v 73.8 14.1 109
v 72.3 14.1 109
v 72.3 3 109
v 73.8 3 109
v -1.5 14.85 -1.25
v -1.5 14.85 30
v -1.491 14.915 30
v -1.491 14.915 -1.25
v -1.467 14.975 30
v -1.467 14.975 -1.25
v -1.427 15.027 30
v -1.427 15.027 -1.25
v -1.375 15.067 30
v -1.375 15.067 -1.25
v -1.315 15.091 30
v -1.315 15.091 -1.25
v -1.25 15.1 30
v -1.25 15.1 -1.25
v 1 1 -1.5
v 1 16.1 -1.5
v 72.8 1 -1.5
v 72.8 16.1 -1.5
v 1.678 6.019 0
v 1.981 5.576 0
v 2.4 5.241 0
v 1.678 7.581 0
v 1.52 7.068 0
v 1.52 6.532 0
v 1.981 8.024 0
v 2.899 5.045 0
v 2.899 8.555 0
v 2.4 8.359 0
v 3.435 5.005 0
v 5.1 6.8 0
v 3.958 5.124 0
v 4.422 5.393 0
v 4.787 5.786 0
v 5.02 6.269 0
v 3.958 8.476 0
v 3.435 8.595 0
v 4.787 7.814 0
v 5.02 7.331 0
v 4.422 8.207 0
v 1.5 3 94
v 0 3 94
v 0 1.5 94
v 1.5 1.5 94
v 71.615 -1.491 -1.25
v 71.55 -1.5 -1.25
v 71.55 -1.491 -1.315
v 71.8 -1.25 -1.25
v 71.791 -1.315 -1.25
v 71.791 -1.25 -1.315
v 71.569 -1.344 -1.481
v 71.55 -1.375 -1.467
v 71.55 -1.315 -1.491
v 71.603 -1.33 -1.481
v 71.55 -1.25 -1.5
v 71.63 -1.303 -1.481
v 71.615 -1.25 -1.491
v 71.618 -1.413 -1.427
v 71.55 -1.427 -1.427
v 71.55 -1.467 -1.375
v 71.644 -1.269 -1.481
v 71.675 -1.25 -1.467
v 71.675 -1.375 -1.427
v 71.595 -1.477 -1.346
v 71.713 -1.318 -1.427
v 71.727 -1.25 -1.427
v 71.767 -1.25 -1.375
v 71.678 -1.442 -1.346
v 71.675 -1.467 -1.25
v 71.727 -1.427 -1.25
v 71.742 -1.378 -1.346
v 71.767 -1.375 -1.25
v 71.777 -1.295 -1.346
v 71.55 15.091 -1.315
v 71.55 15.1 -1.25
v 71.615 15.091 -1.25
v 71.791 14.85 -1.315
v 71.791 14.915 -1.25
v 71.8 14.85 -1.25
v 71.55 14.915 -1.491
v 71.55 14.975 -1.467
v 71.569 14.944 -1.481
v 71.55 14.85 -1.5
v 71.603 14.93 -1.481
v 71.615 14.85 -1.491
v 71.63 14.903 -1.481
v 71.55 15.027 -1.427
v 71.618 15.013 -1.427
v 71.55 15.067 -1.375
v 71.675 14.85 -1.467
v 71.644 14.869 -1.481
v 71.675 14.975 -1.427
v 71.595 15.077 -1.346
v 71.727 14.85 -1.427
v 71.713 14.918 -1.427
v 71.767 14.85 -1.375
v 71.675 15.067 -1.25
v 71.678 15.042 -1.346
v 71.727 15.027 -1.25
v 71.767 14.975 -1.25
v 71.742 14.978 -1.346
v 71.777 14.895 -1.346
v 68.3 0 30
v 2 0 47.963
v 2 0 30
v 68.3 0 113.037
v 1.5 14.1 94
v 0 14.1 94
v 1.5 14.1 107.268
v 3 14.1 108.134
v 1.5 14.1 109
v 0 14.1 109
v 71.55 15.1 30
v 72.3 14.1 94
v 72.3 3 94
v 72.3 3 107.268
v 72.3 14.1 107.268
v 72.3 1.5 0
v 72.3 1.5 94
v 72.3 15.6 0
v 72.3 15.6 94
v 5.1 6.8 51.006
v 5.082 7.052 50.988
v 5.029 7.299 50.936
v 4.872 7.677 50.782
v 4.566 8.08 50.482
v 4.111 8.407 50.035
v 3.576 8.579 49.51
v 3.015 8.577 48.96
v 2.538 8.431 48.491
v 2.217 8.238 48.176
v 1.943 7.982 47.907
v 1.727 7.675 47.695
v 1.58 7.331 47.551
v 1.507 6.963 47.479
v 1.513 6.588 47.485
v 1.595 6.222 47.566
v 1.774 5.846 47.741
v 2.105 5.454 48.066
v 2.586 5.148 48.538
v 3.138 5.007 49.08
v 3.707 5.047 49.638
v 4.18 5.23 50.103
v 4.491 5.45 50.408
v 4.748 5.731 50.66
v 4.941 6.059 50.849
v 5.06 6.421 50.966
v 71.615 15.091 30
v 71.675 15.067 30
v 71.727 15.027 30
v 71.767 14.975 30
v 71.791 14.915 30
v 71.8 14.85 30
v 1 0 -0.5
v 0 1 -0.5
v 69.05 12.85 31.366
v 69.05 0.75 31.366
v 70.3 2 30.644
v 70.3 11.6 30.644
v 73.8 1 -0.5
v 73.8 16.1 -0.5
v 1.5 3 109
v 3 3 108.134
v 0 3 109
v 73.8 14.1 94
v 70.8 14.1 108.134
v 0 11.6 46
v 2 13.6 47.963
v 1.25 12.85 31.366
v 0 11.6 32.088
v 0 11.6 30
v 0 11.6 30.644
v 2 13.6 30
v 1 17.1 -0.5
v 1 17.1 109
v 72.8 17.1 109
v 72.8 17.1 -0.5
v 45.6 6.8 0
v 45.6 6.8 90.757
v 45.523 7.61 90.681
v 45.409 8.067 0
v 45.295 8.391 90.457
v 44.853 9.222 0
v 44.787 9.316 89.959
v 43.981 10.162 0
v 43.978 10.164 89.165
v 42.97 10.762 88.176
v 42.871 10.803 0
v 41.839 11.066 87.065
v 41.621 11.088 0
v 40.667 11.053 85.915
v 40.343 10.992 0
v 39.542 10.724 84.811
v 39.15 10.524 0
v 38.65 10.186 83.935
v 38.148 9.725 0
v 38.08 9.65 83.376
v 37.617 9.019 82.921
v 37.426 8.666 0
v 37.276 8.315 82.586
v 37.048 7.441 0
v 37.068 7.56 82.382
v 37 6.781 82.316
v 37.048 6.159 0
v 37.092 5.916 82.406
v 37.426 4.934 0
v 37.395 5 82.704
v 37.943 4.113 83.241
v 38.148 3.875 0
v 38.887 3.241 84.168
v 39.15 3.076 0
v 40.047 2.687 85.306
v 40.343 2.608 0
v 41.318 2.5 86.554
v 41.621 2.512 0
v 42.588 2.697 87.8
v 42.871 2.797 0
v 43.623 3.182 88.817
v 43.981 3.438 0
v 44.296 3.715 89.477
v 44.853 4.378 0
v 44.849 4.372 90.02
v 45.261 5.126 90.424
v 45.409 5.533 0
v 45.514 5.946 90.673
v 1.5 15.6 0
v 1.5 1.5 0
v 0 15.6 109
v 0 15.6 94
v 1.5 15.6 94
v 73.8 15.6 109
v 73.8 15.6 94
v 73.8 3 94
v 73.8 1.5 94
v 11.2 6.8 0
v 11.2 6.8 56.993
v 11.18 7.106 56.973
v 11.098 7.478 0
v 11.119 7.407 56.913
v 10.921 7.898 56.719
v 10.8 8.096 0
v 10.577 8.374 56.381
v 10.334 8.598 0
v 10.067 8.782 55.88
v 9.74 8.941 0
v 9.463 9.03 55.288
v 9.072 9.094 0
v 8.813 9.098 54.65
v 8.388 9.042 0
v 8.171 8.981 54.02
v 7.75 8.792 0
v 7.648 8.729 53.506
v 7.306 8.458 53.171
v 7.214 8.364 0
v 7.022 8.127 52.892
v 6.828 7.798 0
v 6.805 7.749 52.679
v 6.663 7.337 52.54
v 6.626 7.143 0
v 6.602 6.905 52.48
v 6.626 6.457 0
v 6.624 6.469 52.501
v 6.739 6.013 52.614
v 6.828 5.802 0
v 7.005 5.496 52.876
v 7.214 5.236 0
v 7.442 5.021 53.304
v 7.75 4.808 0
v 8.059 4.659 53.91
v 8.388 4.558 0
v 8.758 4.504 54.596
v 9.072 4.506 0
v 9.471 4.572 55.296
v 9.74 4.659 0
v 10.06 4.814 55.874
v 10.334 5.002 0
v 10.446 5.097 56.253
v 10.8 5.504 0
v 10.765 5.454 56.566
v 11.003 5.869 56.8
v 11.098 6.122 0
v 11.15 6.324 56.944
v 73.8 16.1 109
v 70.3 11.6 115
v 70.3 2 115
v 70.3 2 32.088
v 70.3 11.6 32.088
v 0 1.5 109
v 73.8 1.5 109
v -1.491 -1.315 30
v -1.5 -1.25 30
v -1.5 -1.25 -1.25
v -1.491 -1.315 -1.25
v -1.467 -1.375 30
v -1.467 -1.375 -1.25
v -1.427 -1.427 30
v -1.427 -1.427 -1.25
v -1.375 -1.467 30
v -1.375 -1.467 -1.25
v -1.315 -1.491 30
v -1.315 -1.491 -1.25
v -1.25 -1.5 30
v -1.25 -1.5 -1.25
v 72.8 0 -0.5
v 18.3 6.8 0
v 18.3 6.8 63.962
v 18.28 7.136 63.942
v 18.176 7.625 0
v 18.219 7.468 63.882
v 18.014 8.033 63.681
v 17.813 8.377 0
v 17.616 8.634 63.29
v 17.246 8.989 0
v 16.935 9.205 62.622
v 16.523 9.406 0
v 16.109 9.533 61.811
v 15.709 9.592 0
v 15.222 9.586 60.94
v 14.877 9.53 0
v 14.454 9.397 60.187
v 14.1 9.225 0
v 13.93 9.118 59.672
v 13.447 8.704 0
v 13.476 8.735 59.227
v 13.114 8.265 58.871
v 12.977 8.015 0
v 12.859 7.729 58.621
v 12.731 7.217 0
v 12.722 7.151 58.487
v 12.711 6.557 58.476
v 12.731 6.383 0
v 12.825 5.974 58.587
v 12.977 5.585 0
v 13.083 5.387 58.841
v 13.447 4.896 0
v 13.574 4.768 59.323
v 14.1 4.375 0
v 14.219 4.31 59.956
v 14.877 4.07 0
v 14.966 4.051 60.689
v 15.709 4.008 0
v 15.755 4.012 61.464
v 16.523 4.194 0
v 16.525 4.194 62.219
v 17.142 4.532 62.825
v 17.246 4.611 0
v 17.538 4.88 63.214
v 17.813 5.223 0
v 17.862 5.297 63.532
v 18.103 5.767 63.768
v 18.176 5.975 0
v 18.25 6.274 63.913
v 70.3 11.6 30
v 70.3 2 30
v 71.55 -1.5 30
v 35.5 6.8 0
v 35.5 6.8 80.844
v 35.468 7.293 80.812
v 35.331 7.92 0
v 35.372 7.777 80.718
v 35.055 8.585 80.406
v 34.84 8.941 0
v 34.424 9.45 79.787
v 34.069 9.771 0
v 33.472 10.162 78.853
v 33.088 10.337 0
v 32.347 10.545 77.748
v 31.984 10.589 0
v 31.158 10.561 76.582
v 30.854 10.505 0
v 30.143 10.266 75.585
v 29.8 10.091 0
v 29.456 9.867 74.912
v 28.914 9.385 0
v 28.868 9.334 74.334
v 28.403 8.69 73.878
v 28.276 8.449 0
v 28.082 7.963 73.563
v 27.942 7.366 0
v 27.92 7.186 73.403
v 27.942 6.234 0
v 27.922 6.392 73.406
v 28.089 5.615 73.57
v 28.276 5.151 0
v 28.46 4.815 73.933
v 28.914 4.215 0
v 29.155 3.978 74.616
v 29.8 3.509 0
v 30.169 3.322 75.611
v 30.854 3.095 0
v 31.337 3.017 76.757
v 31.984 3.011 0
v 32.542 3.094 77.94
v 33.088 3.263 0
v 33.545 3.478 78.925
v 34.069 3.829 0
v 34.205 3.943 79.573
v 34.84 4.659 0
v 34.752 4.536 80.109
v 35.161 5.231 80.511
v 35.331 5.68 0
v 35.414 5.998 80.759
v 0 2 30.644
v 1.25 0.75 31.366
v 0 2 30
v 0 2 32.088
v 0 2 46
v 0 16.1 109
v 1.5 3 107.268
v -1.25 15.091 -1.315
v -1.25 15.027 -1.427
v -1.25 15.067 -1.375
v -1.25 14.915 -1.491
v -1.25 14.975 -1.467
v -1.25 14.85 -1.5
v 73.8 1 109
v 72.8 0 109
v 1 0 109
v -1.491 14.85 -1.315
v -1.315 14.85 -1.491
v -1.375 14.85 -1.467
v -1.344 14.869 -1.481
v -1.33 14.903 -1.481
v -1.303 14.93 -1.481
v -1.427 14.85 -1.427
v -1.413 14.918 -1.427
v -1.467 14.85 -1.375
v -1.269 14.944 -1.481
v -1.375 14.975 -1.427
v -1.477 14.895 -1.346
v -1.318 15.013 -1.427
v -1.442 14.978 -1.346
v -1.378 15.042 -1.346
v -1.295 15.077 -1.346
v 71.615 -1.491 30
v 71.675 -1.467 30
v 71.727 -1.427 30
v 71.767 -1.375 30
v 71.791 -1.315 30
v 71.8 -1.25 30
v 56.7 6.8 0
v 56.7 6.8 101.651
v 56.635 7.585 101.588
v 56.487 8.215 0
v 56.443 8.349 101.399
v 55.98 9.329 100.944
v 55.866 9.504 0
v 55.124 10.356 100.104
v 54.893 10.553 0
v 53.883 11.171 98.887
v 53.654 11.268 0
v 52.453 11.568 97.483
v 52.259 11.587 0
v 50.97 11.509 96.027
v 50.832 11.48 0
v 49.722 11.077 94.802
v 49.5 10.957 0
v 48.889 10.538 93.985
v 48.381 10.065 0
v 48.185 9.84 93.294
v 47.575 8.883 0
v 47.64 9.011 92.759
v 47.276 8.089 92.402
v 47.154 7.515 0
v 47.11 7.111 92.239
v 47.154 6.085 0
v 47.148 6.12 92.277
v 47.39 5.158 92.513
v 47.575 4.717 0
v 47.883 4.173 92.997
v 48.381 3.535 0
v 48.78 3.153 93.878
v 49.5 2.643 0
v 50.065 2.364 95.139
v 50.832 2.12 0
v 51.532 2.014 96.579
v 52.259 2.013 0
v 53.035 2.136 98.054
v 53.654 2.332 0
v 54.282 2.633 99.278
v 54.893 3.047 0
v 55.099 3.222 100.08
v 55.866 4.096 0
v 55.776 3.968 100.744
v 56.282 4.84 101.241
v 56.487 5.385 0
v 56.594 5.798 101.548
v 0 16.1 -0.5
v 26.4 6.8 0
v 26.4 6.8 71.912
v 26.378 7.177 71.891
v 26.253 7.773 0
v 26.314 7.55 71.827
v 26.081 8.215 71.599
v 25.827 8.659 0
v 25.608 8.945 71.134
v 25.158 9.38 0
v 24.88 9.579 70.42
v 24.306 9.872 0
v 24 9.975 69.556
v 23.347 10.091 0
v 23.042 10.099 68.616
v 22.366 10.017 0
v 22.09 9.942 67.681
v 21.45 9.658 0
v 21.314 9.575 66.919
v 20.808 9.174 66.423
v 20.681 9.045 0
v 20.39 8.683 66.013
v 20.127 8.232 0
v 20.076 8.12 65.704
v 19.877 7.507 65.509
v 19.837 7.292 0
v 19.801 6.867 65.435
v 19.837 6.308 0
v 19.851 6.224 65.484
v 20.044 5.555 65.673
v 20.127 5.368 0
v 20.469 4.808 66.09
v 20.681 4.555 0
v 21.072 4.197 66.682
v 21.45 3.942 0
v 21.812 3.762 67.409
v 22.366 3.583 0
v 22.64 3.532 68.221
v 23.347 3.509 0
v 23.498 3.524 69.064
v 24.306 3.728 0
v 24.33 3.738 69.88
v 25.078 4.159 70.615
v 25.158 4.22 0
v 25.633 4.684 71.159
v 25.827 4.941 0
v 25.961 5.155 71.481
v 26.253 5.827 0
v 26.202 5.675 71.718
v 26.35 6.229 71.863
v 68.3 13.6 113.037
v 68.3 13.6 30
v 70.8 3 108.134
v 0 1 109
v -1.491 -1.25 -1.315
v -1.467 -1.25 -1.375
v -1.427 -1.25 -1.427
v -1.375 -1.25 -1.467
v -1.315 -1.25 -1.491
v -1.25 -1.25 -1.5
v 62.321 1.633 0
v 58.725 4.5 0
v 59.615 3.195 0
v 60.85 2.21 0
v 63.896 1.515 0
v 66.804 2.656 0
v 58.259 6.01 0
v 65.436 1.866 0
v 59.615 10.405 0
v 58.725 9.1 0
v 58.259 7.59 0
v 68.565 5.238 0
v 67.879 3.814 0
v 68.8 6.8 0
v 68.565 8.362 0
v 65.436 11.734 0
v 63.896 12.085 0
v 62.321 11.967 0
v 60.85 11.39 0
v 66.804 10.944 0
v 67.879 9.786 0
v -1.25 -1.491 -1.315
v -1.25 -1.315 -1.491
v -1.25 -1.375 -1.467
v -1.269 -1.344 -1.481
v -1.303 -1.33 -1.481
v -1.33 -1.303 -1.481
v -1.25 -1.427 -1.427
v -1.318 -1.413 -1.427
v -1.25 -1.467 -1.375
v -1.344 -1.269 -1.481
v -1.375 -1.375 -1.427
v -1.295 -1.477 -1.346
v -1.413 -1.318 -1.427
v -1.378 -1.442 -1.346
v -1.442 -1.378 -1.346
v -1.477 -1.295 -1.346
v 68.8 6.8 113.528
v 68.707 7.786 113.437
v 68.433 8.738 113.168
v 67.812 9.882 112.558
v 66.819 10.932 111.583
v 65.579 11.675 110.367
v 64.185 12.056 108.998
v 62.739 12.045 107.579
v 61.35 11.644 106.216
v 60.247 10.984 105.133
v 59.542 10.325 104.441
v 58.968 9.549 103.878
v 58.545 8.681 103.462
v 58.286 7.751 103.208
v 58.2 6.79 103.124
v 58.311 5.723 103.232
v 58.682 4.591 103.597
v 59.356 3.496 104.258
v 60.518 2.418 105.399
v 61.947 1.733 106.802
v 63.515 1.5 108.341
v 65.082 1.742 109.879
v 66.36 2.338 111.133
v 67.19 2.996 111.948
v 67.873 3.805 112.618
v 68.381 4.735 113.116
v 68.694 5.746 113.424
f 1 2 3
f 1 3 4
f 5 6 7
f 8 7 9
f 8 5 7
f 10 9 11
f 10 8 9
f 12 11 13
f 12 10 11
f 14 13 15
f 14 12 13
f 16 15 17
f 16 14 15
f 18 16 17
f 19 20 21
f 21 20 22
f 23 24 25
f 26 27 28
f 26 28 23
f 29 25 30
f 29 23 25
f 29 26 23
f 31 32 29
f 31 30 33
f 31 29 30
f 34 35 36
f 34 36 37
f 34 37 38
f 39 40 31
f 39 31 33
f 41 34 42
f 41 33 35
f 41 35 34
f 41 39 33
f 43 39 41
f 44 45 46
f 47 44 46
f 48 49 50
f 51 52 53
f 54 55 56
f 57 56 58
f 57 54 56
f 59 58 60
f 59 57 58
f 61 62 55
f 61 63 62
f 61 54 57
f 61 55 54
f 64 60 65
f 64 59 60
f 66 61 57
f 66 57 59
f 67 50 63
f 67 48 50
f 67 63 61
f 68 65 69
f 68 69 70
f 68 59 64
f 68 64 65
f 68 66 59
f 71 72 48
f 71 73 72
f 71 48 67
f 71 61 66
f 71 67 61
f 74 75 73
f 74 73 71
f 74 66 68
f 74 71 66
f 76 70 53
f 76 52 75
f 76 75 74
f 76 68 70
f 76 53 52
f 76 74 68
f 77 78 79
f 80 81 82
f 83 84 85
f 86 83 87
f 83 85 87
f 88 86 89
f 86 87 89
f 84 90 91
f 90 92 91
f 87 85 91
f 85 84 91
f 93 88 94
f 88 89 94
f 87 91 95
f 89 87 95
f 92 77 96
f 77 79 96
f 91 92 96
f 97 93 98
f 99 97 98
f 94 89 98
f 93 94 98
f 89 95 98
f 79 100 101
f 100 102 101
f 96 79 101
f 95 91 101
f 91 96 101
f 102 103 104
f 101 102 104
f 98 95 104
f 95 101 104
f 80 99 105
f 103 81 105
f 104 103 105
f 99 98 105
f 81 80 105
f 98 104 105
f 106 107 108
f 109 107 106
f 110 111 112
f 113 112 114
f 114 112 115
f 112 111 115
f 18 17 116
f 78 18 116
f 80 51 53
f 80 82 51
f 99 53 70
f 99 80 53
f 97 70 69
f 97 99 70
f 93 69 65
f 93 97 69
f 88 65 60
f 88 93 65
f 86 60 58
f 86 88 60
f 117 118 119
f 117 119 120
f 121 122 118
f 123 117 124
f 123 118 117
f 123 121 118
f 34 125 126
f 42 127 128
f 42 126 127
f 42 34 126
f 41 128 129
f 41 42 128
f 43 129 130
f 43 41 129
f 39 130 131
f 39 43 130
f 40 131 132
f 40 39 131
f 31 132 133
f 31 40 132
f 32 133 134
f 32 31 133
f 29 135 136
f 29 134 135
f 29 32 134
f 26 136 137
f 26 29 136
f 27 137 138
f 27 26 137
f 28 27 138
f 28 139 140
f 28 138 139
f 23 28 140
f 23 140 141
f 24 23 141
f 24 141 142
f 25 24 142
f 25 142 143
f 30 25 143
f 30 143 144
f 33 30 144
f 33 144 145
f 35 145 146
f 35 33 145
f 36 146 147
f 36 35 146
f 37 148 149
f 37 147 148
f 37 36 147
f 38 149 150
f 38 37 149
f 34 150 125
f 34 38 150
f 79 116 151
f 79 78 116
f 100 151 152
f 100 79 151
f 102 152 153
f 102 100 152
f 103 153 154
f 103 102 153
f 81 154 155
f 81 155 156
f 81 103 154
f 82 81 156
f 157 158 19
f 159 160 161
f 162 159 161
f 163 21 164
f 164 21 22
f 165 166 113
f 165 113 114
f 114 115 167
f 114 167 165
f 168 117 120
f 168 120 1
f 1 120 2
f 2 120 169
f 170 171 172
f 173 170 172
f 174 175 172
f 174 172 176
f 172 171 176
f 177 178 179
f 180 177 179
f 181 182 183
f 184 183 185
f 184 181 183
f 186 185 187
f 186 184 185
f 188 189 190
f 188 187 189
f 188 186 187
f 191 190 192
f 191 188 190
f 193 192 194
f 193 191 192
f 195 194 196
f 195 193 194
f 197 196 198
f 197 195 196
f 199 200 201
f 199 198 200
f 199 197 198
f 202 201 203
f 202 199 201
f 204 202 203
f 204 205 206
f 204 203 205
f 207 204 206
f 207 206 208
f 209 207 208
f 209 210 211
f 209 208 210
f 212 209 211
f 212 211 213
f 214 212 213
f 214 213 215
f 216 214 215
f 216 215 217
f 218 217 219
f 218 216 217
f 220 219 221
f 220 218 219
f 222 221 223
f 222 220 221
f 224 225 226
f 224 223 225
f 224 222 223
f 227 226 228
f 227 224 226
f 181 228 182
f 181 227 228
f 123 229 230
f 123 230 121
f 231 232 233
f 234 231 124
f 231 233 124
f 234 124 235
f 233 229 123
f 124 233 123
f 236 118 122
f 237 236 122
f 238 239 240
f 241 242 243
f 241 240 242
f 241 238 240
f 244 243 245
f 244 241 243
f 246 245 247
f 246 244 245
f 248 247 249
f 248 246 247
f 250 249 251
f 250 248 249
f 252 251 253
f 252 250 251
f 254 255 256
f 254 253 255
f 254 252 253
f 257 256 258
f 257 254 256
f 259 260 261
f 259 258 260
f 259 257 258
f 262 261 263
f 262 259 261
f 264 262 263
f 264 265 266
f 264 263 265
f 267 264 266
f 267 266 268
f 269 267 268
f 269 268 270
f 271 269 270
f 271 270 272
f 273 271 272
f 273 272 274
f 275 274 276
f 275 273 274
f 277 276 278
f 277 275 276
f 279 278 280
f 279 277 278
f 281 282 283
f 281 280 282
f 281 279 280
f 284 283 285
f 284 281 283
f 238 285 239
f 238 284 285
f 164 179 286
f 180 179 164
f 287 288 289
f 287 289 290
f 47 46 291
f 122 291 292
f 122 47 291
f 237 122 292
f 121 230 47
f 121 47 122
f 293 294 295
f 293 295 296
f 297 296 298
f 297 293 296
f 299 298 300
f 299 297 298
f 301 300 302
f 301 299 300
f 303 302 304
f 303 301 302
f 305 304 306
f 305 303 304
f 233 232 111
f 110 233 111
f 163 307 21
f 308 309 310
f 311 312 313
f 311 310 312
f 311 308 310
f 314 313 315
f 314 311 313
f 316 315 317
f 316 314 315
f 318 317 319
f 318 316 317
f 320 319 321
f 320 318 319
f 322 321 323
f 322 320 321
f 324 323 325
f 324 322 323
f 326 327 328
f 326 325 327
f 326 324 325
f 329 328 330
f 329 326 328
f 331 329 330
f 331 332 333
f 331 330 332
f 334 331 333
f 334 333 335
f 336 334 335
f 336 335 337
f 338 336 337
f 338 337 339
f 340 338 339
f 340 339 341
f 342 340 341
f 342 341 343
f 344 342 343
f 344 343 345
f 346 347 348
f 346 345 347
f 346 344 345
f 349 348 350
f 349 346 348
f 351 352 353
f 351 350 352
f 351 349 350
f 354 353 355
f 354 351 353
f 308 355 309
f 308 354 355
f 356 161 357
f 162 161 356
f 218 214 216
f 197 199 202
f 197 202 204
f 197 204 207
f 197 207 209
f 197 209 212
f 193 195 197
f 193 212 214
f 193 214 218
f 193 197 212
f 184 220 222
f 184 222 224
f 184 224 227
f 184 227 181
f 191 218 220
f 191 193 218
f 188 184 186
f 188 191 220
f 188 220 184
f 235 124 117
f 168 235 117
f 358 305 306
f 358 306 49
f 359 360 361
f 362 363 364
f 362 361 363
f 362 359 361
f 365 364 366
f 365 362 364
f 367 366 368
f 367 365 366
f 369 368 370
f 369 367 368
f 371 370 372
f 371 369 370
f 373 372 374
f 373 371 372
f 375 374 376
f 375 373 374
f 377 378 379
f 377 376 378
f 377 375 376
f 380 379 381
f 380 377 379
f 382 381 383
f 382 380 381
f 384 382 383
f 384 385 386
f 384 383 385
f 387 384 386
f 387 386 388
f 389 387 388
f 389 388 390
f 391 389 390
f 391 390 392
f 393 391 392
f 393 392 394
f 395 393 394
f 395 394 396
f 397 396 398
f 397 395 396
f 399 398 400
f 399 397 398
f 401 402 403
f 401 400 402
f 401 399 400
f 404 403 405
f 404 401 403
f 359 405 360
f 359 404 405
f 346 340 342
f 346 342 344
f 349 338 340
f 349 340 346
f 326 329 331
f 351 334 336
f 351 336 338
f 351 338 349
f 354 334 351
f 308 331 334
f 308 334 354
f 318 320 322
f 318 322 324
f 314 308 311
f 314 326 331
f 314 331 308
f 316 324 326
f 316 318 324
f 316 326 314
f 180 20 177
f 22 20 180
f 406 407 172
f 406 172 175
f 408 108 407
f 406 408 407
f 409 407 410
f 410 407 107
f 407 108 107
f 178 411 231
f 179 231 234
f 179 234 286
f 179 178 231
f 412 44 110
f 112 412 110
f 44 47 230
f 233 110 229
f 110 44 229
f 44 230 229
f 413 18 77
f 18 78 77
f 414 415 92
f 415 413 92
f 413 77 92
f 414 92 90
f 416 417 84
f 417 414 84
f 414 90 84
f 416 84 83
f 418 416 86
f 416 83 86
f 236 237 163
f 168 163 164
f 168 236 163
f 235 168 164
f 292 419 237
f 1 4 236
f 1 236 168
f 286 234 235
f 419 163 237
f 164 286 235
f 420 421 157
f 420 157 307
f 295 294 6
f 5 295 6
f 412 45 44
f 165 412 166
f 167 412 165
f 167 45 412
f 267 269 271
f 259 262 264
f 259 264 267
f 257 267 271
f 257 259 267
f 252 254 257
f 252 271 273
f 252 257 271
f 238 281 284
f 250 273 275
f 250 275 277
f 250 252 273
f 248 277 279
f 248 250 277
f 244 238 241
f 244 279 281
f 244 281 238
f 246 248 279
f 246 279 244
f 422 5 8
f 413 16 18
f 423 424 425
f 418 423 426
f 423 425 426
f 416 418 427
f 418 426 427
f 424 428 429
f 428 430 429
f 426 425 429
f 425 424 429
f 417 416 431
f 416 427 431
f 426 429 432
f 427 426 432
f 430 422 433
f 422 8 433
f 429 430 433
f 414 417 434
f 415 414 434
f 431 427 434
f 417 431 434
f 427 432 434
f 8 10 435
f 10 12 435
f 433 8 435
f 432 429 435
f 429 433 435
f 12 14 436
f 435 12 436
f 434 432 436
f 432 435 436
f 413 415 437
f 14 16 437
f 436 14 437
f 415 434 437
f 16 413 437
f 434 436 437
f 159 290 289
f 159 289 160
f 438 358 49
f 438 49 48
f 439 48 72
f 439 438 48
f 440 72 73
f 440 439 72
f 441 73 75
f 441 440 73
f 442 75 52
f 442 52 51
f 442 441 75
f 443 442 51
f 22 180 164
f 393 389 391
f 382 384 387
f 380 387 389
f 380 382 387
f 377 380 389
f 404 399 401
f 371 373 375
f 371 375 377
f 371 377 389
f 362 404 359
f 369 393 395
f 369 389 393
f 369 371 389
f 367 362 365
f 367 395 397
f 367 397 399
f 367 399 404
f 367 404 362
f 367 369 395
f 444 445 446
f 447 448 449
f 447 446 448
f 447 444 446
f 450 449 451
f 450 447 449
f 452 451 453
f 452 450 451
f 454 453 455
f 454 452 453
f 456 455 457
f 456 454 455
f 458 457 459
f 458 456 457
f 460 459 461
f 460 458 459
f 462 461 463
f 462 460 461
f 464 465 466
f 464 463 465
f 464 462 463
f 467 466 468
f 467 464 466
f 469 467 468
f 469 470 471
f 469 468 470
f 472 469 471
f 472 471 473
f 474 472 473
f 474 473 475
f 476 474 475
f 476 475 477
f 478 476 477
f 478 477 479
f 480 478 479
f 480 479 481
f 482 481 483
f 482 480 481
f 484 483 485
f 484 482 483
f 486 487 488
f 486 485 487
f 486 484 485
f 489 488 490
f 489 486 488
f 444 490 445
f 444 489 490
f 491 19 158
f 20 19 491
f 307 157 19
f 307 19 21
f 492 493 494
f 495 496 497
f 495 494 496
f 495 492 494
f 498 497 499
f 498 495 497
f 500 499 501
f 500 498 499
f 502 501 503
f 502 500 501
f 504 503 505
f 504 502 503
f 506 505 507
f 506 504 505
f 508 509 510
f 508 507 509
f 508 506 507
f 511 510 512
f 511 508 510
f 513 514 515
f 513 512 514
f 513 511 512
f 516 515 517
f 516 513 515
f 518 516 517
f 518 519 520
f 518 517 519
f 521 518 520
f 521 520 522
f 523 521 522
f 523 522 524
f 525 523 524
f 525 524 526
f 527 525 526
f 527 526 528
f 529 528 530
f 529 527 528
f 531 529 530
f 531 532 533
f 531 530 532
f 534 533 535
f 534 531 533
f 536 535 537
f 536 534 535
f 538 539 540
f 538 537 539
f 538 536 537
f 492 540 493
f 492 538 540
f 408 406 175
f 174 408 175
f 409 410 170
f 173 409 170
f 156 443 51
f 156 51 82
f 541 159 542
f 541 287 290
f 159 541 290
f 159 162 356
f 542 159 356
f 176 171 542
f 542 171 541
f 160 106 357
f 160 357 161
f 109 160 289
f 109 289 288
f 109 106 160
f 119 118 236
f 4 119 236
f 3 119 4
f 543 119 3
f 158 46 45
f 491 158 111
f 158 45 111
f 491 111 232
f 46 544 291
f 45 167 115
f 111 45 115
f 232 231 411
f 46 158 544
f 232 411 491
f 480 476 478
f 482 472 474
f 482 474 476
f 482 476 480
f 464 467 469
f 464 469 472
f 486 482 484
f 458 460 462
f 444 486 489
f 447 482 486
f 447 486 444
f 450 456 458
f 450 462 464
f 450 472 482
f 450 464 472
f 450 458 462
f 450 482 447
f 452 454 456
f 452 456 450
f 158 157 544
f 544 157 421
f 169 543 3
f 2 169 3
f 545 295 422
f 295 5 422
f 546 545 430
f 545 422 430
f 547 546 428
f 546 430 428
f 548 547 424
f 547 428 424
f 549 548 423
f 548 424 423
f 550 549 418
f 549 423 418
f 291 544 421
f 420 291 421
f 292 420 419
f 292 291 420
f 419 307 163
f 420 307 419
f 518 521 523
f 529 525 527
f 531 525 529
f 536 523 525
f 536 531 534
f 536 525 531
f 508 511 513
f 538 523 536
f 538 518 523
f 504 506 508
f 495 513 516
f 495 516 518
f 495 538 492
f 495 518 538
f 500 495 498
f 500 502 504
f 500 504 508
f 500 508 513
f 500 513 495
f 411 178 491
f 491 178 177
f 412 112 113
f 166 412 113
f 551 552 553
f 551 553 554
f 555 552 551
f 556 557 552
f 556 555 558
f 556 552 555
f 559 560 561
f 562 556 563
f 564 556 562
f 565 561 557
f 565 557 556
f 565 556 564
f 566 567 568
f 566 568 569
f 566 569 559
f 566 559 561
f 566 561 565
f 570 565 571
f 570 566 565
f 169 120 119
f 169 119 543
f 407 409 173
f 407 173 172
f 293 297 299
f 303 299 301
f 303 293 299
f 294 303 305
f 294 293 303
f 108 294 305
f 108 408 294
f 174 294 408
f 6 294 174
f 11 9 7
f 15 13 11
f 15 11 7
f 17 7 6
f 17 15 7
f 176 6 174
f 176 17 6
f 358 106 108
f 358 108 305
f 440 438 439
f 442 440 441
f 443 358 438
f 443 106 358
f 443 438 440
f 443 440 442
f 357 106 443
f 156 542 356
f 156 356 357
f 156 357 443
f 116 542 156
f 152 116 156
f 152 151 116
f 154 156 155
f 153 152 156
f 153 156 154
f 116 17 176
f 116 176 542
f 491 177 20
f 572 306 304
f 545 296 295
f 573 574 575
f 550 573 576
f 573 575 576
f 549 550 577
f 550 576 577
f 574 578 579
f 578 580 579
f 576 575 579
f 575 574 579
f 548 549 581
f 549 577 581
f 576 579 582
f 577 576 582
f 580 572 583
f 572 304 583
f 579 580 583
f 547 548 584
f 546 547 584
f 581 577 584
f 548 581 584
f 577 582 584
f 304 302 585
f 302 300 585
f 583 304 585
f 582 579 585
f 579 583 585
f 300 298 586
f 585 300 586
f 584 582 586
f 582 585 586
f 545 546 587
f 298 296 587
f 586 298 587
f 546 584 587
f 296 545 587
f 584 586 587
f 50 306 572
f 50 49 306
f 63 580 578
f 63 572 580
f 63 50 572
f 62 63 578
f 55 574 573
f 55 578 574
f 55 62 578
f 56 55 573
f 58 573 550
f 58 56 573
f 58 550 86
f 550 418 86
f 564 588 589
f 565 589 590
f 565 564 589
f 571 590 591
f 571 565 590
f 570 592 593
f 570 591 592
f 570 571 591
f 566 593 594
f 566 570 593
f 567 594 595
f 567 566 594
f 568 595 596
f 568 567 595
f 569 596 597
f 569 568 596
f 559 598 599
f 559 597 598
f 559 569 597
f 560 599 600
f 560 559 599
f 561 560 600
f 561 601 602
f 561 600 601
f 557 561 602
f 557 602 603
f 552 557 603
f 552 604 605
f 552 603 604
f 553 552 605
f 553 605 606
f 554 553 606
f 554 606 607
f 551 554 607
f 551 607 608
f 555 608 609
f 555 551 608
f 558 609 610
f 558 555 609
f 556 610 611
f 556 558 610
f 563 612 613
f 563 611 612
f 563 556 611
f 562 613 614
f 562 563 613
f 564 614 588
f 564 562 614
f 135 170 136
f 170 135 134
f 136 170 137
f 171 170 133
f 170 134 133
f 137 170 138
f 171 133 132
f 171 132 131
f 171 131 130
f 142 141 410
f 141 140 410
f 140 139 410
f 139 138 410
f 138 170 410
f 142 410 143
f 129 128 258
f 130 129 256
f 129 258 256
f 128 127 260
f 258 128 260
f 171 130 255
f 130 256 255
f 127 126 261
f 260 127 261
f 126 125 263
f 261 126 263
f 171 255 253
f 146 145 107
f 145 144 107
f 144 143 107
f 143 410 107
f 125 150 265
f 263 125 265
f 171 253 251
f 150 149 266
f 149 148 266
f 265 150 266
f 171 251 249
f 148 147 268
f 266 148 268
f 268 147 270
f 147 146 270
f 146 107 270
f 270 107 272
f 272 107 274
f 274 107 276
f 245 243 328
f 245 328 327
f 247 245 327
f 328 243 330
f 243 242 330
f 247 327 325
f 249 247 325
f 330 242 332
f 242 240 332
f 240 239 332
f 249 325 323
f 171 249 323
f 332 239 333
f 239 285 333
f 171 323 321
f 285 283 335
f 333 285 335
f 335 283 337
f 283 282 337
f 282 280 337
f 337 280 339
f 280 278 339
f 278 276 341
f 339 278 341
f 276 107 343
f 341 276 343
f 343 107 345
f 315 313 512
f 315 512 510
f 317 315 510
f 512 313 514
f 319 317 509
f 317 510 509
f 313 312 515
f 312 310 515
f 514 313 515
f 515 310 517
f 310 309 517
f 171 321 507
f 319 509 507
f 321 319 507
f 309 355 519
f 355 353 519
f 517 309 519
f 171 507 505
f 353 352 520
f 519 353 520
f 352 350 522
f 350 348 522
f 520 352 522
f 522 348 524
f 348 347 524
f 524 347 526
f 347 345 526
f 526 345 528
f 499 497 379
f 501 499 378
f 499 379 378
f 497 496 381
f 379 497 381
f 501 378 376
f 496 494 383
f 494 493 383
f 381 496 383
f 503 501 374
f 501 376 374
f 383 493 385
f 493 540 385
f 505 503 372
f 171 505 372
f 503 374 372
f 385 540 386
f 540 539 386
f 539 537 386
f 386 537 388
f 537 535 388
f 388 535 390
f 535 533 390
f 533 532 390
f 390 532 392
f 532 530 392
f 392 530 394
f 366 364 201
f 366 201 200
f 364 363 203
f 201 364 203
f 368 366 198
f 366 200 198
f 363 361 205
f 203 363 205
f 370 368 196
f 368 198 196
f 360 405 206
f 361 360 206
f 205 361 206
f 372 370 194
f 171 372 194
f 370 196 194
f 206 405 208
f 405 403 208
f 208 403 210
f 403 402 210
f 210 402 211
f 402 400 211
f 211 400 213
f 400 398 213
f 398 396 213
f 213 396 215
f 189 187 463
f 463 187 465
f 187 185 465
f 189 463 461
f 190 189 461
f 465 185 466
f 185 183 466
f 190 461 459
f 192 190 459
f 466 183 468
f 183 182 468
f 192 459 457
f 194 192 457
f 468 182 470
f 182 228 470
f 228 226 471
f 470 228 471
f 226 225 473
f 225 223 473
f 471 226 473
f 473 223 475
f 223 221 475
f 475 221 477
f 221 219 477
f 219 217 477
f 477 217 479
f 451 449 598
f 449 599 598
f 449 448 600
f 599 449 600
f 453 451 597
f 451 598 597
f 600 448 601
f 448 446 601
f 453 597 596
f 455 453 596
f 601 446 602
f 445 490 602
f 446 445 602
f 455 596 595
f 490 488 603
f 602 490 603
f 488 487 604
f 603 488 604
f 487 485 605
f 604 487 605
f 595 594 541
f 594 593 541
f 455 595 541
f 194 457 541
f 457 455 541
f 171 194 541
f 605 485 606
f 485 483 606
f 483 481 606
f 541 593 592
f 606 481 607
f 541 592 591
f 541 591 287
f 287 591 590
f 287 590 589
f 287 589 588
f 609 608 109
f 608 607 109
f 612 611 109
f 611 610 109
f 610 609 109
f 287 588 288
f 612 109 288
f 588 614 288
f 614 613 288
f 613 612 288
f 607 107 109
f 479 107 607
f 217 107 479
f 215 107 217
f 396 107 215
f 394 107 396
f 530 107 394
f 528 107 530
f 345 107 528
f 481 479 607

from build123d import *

# Parameters (mm, degrees)
SKETCH_W          = 70.3
SKETCH_H          = 13.6
SKETCH_R          = 1.8
SKETCH_R_2        = 2.3
SKETCH_R_3        = 2.8
SKETCH_R_4        = 3.3
SKETCH_R_5        = 3.8
SKETCH_R_6        = 4.3
SKETCH_R_7        = 4.8
SKETCH_R_8        = 5.3
PAD_DEPTH         = 115
POCKET_DEPTH      = 13.601
SKETCH002_W       = 70.3
SKETCH002_H       = 13.6
PAD001_DEPTH      = 1.5
SKETCH005_W       = 73.3
SKETCH005_H       = 16.6
SKETCH005_W_2     = 70.3
SKETCH005_H_2     = 13.6
PAD004_DEPTH      = 30
PAD004_DEPTH_BACK = 1.5
CHAMFER_SIZE      = 2
FILLET_R          = 0.25
POCKET001_DEPTH   = 15.101
SKETCH003_W       = 73.8
SKETCH003_H       = 17.1
SKETCH003_W_2     = 70.8
SKETCH003_H_2     = 14.1
PAD002_DEPTH      = 109
SKETCH004_W       = 73.8
SKETCH004_H       = 17.1
PAD003_DEPTH      = 1.5
CHAMFER001_SIZE   = 1
PAD005_DEPTH      = 14.1
SKETCH008_W       = 1.5
SKETCH008_H       = 15
POCKET002_DEPTH   = 73.801


with BuildPart() as box:
    # Sketch → Pad (new body)
    with BuildSketch(Plane.XY):
        with Locations((35.15, 6.8)):
            Rectangle(SKETCH_W, SKETCH_H)
        with Locations((3.3, 6.8)):
            Circle(SKETCH_R, mode=Mode.SUBTRACT)
        with Locations((8.9, 6.8)):
            Circle(SKETCH_R_2, mode=Mode.SUBTRACT)
        with Locations((15.5, 6.8)):
            Circle(SKETCH_R_3, mode=Mode.SUBTRACT)
        with Locations((23.1, 6.8)):
            Circle(SKETCH_R_4, mode=Mode.SUBTRACT)
        with Locations((31.7, 6.8)):
            Circle(SKETCH_R_5, mode=Mode.SUBTRACT)
        with Locations((41.3, 6.8)):
            Circle(SKETCH_R_6, mode=Mode.SUBTRACT)
        with Locations((51.9, 6.8)):
            Circle(SKETCH_R_7, mode=Mode.SUBTRACT)
        with Locations((63.5, 6.8)):
            Circle(SKETCH_R_8, mode=Mode.SUBTRACT)
    extrude(amount=PAD_DEPTH)

    # Sketch001 → Pocket (cut, through all)
    with BuildSketch(Plane.XZ):
        Polygon((-10, 46), (0, 46), (70.3, 115), (70.3, 125), (-10, 125), align=None)
    extrude(amount=-POCKET_DEPTH, mode=Mode.SUBTRACT)

    # Sketch002 → Pad001 (join)
    with BuildSketch(Plane.XY):
        with Locations((35.15, 6.8)):
            Rectangle(SKETCH002_W, SKETCH002_H)
    extrude(amount=-PAD001_DEPTH)

    # Sketch005 → Pad004 (join, two sides)
    with BuildSketch(Plane.XY) as pad004_sk:
        with Locations((35.15, 6.8)):
            Rectangle(SKETCH005_W, SKETCH005_H)
        with Locations((35.15, 6.8)):
            Rectangle(SKETCH005_W_2, SKETCH005_H_2, mode=Mode.SUBTRACT)
    extrude(amount=PAD004_DEPTH)
    extrude(pad004_sk.sketch, amount=-PAD004_DEPTH_BACK)

    # Chamfer
    chamfer_edges = [box.edges().sort_by_distance(p)[0] for p in [
        (70.3, 0, 72.5),
        (70.3, 13.6, 72.5),
        (0, 0, 38),
        (0, 13.6, 38),
    ]]
    chamfer(chamfer_edges, length=CHAMFER_SIZE)

    # Fillet
    fillet_edges = [box.edges().sort_by_distance(p)[0] for p in [
        (-1.5, -1.5, 14.25),
        (71.8, -1.5, 14.25),
        (71.8, 15.1, 14.25),
        (-1.5, 15.1, 14.25),
        (35.15, -1.5, -1.5),
        (-1.5, 6.8, -1.5),
        (35.15, 15.1, -1.5),
        (71.8, 6.8, -1.5),
    ]]
    fillet(fillet_edges, radius=FILLET_R)

    # Sketch006 (on Face10 of Fillet) → Pocket001 (cut, through all)
    with BuildSketch(Plane.XZ):
        Polygon((-0.25, 32.232051), (1.25, 31.366025), (-0.25, 30.5), align=None)
        Polygon((70.55, 32.232051), (69.05, 31.366025), (70.55, 30.5), align=None)
    extrude(amount=-POCKET001_DEPTH, mode=Mode.SUBTRACT)


with BuildPart() as cap:
    # Sketch003 → Pad002 (new body)
    with BuildSketch(Plane.XY):
        with Locations((36.9, 8.55)):
            Rectangle(SKETCH003_W, SKETCH003_H)
        with Locations((36.9, 8.55)):
            Rectangle(SKETCH003_W_2, SKETCH003_H_2, mode=Mode.SUBTRACT)
    extrude(amount=PAD002_DEPTH)

    # Sketch004 → Pad003 (join)
    with BuildSketch(Plane.XY):
        with Locations((36.9, 8.55)):
            Rectangle(SKETCH004_W, SKETCH004_H)
    extrude(amount=-PAD003_DEPTH)

    # Chamfer001
    chamfer001_edges = [cap.edges().sort_by_distance(p)[0] for p in [
        (73.8, 17.1, 53.75),
        (0, 17.1, 53.75),
        (36.9, 17.1, -1.5),
        (0, 8.55, -1.5),
        (0, 0, 53.75),
        (36.9, 0, -1.5),
        (73.8, 0, 53.75),
        (73.8, 8.55, -1.5),
    ]]
    chamfer(chamfer001_edges, length=CHAMFER001_SIZE)

    # Sketch007 (on Face21 of Chamfer001) → Pad005 (join)
    with BuildSketch(Plane(origin=(0, 1.5, 0), x_dir=(-1, 0, 0), z_dir=(0, 1, 0))):
        Polygon((-72.3, 109), (-72.3, 107.267949), (-70.8, 108.133975), align=None)
        Polygon((-1.5, 109), (-1.5, 107.267949), (-3, 108.133975), align=None)
    extrude(amount=PAD005_DEPTH)

    # Sketch008 (on Face11 of Pad005) → Pocket002 (cut, through all)
    with BuildSketch(Plane(origin=(0, 0, 0), x_dir=(0, -1, 0), z_dir=(-1, 0, 0))):
        with Locations((-14.85, 101.5)):
            Rectangle(SKETCH008_W, SKETCH008_H)
        with Locations((-2.25, 101.5)):
            Rectangle(SKETCH008_W, SKETCH008_H)
    extrude(amount=-POCKET002_DEPTH, mode=Mode.SUBTRACT)


solid = Compound([box.part, cap.part])
